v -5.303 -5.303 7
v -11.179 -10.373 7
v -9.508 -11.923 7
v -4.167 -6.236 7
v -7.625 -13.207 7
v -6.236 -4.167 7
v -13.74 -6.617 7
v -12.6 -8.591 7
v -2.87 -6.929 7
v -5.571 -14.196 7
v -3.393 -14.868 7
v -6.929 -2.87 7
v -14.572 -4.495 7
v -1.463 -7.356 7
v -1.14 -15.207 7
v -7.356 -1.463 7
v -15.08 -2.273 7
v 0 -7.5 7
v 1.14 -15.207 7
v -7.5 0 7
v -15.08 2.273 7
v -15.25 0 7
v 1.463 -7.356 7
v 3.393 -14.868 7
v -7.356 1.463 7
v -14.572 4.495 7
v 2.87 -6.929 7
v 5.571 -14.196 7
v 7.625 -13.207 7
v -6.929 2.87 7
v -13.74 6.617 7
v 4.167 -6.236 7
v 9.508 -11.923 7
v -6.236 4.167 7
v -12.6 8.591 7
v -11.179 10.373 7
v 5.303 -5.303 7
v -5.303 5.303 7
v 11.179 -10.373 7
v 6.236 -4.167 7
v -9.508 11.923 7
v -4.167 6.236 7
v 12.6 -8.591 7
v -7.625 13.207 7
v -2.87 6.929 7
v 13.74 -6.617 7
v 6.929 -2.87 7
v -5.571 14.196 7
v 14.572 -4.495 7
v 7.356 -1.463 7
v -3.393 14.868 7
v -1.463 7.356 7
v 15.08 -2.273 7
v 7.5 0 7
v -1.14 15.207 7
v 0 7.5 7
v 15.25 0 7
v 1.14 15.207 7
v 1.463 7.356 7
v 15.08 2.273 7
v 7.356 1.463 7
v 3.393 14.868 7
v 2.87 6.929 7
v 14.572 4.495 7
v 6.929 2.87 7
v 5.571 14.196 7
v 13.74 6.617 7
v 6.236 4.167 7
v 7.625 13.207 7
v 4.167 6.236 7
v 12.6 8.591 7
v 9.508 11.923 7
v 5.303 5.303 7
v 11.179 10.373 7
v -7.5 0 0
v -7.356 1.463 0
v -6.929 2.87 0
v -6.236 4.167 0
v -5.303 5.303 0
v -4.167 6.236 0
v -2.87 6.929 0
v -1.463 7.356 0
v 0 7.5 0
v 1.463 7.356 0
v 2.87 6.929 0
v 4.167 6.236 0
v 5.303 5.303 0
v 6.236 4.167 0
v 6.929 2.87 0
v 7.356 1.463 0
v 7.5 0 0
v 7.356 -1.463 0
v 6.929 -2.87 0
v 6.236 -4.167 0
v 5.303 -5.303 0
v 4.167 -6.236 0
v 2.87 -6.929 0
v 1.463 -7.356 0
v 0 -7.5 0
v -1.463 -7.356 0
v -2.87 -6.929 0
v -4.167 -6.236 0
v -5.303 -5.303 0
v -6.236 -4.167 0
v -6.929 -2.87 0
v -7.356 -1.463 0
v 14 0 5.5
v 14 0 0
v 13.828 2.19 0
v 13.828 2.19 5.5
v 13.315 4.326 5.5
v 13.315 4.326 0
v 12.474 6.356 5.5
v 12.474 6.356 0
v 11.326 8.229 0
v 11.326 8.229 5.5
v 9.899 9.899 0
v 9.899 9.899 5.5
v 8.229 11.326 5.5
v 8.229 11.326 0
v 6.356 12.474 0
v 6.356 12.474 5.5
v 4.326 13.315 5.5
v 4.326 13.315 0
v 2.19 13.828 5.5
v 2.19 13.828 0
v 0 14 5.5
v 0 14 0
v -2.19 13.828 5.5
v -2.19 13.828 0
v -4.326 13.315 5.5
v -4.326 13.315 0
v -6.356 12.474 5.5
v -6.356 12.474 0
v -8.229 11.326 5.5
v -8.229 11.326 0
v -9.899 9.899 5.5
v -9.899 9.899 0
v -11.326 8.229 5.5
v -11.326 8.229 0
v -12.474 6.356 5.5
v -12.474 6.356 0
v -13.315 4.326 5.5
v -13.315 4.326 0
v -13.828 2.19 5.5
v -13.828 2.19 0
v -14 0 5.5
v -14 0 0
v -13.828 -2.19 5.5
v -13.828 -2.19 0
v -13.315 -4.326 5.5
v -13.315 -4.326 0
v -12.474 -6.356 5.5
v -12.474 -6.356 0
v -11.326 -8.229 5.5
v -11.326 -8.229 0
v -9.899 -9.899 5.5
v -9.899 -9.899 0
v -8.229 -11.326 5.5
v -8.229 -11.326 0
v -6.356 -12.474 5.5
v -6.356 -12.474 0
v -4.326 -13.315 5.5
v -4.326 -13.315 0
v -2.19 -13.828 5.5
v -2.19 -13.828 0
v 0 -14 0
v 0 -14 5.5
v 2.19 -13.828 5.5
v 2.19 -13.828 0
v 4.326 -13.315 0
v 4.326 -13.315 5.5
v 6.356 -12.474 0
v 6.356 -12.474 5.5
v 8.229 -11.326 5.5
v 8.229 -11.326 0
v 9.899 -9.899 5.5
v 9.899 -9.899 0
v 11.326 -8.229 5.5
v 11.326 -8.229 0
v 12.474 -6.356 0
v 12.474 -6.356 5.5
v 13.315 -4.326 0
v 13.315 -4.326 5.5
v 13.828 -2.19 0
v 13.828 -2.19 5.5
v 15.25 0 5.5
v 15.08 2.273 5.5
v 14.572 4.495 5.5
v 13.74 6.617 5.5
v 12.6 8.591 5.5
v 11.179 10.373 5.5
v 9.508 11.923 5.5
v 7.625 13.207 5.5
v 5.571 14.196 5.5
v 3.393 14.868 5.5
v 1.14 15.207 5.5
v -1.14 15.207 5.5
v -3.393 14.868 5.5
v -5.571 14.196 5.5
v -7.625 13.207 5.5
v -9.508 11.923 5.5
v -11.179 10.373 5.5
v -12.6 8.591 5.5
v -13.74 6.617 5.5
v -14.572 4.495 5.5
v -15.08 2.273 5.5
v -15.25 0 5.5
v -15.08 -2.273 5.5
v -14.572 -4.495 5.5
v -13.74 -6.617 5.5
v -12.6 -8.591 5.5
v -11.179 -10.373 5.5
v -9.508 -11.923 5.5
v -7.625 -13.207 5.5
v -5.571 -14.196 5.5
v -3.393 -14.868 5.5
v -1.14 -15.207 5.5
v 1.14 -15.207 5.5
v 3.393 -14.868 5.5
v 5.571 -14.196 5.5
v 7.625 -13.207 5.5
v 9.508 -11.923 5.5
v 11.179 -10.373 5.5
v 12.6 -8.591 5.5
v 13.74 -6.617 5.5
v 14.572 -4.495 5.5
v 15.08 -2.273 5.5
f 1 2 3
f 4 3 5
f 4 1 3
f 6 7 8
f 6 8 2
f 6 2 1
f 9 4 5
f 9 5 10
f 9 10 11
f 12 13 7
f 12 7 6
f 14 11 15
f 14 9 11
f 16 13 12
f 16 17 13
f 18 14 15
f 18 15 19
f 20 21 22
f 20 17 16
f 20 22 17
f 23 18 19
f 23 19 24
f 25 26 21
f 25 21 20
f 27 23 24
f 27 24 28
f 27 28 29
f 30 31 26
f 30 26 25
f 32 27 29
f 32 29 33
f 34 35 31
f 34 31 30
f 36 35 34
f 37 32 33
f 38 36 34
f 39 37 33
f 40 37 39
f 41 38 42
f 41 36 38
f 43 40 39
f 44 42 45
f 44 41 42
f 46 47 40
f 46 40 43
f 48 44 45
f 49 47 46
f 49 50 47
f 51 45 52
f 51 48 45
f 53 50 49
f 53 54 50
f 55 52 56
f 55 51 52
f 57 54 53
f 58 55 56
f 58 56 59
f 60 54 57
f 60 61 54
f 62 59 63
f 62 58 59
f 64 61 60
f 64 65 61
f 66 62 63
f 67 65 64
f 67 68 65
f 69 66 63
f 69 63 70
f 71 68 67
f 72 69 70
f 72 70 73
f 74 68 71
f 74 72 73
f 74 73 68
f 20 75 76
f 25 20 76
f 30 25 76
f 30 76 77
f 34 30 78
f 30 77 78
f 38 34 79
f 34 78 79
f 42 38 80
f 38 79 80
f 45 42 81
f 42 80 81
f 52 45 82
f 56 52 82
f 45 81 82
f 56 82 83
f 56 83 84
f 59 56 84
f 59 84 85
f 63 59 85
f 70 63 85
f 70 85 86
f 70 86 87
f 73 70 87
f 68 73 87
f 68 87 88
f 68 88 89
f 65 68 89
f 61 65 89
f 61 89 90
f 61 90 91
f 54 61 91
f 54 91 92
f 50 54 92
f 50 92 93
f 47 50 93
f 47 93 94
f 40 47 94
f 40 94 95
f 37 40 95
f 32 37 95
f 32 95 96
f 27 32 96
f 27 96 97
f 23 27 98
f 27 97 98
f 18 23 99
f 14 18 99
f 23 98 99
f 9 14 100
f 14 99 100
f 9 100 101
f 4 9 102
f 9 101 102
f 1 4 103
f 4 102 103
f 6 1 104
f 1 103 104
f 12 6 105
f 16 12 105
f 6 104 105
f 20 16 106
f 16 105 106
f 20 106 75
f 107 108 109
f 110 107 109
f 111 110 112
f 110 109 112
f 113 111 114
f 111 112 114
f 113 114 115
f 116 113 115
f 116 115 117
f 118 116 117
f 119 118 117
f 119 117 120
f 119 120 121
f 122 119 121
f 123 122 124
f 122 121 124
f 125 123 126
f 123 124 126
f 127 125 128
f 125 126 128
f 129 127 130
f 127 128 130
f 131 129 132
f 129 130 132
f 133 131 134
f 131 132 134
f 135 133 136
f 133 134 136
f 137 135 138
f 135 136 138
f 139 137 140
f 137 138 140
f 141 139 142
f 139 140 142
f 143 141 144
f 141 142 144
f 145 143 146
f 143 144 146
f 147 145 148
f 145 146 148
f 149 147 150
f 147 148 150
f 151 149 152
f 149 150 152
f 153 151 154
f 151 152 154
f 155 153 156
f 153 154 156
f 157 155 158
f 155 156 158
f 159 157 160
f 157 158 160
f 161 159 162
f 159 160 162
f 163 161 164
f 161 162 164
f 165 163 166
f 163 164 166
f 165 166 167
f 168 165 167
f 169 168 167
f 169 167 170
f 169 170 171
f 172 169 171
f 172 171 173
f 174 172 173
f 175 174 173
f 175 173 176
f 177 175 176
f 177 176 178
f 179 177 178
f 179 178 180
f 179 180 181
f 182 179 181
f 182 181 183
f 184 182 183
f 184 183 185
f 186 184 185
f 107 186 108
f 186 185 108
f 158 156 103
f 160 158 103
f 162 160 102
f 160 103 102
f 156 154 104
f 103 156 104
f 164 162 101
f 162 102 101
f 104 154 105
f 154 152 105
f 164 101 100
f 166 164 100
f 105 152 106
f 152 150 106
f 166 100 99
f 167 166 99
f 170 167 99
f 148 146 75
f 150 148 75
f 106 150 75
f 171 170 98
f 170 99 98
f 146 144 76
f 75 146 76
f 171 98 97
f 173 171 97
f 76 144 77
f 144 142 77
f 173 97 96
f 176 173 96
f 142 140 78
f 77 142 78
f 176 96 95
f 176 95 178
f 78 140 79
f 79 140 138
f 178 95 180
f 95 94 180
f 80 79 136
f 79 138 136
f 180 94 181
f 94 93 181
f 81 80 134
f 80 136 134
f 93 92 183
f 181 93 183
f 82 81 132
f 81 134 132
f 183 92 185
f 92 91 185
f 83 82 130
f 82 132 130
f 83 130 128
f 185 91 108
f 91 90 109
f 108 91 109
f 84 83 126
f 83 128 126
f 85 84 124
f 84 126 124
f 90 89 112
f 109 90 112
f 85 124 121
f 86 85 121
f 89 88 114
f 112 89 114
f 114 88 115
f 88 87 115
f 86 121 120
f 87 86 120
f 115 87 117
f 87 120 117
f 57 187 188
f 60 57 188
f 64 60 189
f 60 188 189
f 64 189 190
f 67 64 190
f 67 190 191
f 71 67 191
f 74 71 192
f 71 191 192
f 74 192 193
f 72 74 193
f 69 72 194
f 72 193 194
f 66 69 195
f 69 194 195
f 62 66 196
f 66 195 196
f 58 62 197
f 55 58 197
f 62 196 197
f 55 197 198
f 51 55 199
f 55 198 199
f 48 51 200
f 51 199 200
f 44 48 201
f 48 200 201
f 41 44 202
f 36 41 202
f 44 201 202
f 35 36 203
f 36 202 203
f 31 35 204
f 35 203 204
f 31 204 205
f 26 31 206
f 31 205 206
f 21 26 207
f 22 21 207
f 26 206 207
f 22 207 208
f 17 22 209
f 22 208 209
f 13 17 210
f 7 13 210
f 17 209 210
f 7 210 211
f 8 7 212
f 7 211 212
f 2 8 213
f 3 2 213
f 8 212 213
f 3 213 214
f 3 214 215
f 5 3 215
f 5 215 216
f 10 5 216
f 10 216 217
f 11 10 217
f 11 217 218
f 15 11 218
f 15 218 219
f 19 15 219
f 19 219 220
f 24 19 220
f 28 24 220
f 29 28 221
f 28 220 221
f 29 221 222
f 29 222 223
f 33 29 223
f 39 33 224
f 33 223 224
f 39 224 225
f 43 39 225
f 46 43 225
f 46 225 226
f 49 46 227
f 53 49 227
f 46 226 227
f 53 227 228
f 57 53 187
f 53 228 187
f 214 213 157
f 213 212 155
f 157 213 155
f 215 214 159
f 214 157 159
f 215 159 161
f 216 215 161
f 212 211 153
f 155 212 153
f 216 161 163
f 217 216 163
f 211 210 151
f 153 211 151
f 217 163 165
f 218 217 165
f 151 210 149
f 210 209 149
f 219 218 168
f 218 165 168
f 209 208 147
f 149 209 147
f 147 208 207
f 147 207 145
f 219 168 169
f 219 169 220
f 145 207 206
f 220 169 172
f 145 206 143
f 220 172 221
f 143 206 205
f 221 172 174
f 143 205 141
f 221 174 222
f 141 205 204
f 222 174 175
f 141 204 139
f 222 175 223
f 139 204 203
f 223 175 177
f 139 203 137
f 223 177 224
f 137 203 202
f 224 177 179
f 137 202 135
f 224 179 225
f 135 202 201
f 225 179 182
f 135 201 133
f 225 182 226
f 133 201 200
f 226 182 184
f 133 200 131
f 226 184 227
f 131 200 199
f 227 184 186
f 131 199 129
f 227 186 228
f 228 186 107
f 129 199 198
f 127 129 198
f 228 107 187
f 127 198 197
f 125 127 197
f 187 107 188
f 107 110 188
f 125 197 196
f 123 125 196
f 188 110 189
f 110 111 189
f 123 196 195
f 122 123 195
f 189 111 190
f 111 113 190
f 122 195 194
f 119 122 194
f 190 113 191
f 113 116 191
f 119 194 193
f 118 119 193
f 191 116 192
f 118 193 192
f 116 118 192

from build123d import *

# Parameters (mm, degrees)
SKETCH_1_R          = 14
EXTRUDE_1_DEPTH     = 5.5
SKETCH_2_R          = 15.25
EXTRUDE_2_DEPTH     = 1.5
CUT_EXTRUDE_1_REACH = 9
SKETCH_3_R          = 7.5


with BuildPart() as part:
    # 草图1 → 凸台-拉伸1 (new body)
    with BuildSketch(Plane.XY):
        Circle(SKETCH_1_R)
    extrude(amount=EXTRUDE_1_DEPTH)

    # 草图2 → 凸台-拉伸2 (add)
    with BuildSketch(Plane.XY.offset(5.5)):
        Circle(SKETCH_2_R)
    extrude(amount=EXTRUDE_2_DEPTH)

    # 草图3 → 切除-拉伸1 (cut, up to next)
    with BuildSketch(Plane(origin=(0, 0, 0), x_dir=(-1, 0, 0), z_dir=(0, 0, -1)), mode=Mode.PRIVATE) as cut_extrude_1_sk1:
        Circle(SKETCH_3_R)
    cut_extrude_1_tool1 = extrude(cut_extrude_1_sk1.sketch, amount=-CUT_EXTRUDE_1_REACH, mode=Mode.PRIVATE) & part.part
    add(cut_extrude_1_tool1.solids().sort_by_distance((0, 0, 0))[0], mode=Mode.SUBTRACT)


solid = part.part
